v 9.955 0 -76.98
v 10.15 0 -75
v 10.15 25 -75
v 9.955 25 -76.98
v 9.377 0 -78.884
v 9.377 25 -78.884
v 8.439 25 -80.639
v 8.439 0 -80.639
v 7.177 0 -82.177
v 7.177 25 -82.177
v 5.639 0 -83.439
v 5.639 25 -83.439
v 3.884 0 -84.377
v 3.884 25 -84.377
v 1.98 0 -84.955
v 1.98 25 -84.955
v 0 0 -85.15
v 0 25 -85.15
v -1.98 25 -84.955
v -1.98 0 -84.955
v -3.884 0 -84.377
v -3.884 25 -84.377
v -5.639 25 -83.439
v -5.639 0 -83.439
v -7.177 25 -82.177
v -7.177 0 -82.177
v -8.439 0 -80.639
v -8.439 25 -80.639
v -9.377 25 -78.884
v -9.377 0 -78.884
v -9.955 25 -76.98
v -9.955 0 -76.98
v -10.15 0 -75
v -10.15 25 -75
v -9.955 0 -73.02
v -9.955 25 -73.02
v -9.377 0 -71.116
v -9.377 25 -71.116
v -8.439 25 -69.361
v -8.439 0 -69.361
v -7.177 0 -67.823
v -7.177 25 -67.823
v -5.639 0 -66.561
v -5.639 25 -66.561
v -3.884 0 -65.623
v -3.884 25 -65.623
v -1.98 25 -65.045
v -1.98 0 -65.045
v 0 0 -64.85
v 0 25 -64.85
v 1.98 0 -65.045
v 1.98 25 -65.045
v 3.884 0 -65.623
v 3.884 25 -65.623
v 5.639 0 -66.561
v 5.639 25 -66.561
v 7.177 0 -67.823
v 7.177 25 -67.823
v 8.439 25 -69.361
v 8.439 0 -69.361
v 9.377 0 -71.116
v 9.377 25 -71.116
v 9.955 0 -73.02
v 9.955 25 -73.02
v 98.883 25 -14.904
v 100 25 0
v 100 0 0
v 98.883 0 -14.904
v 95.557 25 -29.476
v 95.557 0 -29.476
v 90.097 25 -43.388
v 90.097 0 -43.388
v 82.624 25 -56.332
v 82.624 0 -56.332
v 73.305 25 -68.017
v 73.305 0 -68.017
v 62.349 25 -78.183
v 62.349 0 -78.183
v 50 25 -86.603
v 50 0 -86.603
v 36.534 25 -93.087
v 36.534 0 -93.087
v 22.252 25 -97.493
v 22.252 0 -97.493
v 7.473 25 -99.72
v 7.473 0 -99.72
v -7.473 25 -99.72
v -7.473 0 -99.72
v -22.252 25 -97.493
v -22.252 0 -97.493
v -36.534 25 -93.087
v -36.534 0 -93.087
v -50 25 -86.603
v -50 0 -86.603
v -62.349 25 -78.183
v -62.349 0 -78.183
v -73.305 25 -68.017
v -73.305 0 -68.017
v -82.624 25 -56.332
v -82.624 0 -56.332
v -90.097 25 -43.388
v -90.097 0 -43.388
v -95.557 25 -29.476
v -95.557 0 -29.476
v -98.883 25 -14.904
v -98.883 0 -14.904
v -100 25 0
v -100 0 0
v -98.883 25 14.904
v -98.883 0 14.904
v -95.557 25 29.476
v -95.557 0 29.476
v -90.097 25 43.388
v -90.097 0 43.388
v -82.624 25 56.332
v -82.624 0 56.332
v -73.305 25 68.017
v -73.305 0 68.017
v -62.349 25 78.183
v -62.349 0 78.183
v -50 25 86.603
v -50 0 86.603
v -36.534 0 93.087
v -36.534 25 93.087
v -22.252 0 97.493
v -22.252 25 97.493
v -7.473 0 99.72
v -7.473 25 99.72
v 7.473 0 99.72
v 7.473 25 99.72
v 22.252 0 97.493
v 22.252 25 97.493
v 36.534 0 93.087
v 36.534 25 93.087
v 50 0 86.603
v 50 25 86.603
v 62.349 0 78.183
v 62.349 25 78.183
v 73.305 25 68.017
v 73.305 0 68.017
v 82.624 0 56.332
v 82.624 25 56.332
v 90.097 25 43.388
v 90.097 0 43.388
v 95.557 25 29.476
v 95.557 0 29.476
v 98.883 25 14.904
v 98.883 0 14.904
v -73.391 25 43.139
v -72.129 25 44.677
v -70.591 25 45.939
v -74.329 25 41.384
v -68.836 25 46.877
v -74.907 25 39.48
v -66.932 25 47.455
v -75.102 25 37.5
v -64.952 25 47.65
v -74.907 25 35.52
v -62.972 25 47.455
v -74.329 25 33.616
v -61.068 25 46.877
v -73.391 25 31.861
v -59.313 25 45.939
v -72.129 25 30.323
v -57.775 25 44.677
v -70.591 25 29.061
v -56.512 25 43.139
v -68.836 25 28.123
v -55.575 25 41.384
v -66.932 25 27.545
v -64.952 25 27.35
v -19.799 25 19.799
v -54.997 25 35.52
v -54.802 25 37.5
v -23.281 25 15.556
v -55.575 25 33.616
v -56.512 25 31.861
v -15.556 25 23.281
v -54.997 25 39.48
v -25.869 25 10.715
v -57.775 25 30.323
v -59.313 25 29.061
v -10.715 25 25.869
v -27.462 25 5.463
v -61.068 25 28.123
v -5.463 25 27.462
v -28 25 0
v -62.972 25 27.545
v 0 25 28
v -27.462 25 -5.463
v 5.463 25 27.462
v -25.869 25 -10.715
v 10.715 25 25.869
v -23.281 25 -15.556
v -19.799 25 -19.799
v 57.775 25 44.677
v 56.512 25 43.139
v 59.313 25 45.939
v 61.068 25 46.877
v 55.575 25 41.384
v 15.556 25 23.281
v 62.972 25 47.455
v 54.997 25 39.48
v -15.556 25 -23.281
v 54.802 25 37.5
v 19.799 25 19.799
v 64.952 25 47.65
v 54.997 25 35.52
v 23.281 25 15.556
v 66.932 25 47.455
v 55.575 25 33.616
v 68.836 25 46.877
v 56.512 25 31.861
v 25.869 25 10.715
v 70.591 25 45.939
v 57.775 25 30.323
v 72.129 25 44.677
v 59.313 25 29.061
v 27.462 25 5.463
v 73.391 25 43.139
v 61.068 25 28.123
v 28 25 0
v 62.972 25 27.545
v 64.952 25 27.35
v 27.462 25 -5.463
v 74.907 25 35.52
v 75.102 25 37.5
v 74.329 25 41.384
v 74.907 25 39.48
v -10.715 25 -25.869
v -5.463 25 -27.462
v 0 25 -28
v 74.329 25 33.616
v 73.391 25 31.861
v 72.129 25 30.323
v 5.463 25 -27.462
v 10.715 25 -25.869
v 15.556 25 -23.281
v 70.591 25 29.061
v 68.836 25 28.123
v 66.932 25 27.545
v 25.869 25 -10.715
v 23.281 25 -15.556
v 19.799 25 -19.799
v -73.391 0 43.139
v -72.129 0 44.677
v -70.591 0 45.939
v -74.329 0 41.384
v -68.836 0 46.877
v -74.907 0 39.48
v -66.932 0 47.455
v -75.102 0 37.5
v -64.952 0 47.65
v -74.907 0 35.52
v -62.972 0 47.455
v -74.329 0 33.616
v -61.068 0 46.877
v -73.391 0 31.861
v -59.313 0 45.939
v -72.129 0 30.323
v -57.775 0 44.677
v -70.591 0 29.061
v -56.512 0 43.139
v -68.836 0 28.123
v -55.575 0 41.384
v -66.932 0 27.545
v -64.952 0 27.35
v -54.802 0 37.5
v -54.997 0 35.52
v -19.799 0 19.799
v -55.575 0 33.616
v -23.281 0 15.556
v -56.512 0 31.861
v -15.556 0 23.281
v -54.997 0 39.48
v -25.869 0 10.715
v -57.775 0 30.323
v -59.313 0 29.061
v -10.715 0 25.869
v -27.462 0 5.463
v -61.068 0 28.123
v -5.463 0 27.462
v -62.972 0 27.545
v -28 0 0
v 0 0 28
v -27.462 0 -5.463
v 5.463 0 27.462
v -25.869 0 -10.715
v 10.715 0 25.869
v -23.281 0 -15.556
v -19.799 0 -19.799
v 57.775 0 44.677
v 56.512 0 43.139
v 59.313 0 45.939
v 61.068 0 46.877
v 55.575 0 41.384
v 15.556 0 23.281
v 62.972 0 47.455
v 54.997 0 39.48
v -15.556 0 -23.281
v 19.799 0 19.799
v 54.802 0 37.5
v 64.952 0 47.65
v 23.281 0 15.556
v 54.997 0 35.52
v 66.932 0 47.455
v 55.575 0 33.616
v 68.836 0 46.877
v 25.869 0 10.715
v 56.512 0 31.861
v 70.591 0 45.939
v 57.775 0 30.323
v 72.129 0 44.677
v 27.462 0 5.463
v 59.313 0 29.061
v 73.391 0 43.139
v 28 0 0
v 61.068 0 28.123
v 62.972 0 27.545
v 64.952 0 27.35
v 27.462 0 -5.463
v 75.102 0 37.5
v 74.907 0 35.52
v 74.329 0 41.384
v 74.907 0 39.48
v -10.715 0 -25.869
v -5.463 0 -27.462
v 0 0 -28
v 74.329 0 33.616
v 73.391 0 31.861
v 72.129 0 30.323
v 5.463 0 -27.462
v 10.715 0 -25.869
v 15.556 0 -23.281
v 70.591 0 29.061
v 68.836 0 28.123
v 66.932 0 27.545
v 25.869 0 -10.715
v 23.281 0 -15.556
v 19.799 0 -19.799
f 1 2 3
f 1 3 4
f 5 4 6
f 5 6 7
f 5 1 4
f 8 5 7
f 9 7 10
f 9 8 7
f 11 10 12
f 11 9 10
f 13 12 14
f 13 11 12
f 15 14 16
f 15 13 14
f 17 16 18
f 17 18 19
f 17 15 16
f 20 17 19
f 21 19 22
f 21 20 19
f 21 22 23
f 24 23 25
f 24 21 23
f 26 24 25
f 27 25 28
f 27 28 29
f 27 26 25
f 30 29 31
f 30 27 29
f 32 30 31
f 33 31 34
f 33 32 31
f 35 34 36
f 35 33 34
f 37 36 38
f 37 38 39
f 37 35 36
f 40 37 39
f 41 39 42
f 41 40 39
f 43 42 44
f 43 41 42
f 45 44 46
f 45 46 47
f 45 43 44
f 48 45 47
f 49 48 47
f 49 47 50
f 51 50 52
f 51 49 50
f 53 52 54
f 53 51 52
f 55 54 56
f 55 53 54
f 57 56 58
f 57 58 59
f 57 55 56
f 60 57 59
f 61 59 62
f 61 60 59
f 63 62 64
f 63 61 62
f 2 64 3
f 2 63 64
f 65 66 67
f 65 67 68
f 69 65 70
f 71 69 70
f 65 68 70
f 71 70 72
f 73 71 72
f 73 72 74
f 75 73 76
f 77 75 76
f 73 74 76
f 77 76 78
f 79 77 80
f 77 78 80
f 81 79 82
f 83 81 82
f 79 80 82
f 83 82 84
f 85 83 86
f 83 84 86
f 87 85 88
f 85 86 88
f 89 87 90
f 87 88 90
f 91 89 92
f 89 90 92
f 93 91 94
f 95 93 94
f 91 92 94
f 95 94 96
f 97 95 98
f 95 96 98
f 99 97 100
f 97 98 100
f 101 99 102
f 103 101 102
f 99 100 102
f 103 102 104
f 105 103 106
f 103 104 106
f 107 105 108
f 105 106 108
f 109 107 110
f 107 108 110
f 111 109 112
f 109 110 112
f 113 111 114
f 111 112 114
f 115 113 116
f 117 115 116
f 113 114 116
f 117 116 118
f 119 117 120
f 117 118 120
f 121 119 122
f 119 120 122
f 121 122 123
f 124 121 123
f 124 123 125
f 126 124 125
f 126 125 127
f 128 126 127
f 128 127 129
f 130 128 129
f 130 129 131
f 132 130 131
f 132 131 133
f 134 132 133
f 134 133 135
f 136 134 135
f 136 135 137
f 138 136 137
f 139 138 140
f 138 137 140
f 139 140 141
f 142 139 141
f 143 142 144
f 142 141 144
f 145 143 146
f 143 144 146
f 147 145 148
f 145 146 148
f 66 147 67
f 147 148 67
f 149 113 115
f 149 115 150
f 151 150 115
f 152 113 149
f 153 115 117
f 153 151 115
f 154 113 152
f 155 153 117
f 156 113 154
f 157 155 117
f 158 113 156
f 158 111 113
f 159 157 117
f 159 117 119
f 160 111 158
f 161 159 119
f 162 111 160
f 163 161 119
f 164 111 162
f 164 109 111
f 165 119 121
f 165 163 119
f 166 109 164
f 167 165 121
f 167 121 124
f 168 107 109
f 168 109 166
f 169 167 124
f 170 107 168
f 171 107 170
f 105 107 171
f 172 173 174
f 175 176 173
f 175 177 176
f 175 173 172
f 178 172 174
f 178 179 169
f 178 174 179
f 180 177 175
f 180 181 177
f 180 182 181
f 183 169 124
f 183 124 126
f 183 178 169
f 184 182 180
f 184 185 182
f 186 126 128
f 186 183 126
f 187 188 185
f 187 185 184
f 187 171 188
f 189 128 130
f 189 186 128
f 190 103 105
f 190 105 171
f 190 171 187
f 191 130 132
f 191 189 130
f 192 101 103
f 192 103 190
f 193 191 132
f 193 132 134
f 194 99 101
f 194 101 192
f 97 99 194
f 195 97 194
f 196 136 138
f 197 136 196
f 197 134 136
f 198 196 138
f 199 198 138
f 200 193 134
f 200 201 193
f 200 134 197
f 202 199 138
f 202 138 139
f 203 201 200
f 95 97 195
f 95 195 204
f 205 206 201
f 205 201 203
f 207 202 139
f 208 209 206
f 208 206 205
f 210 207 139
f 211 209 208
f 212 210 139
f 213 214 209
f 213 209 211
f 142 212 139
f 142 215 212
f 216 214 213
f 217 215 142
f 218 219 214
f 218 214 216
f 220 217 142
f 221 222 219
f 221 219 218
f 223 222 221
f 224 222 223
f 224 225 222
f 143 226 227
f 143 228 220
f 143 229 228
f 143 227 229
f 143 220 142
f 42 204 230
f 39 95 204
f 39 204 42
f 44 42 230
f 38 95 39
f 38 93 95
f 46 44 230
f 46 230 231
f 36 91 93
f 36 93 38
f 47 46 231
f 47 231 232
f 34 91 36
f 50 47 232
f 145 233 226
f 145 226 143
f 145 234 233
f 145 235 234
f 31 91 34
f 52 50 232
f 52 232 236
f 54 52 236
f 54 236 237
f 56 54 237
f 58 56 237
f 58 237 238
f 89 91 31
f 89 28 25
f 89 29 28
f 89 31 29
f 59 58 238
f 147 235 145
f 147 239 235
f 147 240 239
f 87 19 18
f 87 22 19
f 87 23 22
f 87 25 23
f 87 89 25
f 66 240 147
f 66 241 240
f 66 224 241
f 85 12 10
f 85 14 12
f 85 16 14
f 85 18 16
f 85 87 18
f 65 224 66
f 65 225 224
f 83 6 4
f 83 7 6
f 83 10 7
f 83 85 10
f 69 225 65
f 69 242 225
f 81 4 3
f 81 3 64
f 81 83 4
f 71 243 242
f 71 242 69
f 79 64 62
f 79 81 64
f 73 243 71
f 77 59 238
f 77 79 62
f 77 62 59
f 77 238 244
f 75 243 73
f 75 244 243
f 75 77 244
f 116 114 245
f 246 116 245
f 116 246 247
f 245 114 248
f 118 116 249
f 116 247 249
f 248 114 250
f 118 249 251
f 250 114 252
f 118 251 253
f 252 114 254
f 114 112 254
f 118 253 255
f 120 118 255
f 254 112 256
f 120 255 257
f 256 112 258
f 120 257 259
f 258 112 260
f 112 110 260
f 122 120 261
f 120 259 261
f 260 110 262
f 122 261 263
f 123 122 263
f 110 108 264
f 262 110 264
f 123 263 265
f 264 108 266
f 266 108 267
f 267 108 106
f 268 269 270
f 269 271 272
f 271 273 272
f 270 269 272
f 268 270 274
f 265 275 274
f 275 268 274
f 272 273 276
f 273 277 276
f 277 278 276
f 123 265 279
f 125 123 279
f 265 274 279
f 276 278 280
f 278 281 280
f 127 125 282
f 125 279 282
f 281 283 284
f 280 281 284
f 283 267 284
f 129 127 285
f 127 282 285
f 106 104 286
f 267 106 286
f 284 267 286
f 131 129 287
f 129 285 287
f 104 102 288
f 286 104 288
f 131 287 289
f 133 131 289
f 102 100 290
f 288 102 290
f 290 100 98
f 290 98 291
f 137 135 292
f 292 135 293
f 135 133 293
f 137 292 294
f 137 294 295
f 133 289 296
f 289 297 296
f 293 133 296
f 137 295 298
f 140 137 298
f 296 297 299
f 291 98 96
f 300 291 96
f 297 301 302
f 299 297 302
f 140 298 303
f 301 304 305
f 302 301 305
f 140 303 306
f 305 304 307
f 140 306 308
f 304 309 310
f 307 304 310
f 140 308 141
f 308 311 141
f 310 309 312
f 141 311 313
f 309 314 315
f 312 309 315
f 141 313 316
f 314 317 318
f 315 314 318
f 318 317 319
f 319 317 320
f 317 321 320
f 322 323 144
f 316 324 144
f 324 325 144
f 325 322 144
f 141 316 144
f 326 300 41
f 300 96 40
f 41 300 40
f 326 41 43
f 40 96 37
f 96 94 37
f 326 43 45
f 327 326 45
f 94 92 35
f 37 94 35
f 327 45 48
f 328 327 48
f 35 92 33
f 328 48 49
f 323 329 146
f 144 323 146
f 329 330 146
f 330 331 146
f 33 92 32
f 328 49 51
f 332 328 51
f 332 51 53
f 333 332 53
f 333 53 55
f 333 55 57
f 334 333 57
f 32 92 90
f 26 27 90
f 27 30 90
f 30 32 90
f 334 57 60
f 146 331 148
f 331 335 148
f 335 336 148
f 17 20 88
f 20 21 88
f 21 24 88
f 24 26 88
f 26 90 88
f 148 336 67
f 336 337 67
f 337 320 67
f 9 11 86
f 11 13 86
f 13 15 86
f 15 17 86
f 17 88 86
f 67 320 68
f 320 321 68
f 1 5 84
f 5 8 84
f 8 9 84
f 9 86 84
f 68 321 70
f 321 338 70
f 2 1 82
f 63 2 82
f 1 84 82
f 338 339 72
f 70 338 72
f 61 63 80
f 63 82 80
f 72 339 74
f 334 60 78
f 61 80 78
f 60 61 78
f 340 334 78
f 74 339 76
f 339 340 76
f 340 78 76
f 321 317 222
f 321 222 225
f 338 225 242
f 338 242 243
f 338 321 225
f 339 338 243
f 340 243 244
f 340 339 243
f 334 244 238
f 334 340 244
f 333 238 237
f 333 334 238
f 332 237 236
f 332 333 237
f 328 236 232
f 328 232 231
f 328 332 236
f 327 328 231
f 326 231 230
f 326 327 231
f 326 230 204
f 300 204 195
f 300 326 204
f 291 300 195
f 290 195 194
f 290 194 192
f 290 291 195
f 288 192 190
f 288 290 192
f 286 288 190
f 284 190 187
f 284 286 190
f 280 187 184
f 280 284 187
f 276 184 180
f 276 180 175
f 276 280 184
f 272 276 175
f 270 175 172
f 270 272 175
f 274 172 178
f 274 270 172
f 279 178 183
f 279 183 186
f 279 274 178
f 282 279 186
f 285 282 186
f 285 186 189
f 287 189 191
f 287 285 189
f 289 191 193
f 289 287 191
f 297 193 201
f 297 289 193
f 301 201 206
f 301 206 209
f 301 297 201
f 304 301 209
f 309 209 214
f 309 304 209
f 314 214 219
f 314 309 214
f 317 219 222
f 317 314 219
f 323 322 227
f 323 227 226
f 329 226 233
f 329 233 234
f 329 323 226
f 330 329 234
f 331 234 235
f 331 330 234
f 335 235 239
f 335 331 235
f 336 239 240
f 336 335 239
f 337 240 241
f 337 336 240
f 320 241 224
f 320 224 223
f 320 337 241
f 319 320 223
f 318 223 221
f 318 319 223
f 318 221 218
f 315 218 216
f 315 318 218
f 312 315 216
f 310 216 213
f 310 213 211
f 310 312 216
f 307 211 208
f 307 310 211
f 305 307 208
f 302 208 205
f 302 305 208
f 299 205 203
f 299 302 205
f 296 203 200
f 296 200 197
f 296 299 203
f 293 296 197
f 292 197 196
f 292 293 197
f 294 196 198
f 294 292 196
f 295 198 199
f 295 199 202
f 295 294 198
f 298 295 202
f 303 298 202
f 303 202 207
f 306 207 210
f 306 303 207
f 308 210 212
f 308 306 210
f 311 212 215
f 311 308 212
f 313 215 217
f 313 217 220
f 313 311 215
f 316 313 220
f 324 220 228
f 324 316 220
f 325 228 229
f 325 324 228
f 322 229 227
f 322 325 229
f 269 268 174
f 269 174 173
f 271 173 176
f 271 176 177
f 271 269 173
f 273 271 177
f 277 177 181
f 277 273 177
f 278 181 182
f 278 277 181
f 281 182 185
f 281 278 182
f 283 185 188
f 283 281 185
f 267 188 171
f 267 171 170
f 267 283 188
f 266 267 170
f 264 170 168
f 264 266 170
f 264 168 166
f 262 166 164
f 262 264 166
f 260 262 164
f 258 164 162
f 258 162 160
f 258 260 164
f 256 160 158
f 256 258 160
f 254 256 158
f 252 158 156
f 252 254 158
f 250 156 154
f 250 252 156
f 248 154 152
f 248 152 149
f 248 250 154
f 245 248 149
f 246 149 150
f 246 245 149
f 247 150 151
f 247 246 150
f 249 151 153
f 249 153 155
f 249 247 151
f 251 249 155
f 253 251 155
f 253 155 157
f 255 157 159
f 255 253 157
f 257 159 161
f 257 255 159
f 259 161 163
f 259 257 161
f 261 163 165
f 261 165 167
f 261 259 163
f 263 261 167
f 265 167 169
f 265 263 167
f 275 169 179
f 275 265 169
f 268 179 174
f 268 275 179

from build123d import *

# Parameters (mm, degrees)
SKETCH1_R           = 100
SKETCH1_R_2         = 28
SKETCH1_R_3         = 10.15
BOSS_EXTRUDE1_DEPTH = 25


with BuildPart() as part:
    # Sketch1 → Boss-Extrude1 (new body)
    with BuildSketch(Plane(origin=(0, 0, 0), x_dir=(1, 0, 0), z_dir=(0, 1, 0))):
        Circle(SKETCH1_R)
        Circle(SKETCH1_R_2, mode=Mode.SUBTRACT)
        with Locations((0, 75)):
            Circle(SKETCH1_R_3, mode=Mode.SUBTRACT)
        with Locations((64.951905284, -37.5)):
            Circle(SKETCH1_R_3, mode=Mode.SUBTRACT)
        with Locations((-64.951905284, -37.5)):
            Circle(SKETCH1_R_3, mode=Mode.SUBTRACT)
    extrude(amount=BOSS_EXTRUDE1_DEPTH)


solid = part.part
